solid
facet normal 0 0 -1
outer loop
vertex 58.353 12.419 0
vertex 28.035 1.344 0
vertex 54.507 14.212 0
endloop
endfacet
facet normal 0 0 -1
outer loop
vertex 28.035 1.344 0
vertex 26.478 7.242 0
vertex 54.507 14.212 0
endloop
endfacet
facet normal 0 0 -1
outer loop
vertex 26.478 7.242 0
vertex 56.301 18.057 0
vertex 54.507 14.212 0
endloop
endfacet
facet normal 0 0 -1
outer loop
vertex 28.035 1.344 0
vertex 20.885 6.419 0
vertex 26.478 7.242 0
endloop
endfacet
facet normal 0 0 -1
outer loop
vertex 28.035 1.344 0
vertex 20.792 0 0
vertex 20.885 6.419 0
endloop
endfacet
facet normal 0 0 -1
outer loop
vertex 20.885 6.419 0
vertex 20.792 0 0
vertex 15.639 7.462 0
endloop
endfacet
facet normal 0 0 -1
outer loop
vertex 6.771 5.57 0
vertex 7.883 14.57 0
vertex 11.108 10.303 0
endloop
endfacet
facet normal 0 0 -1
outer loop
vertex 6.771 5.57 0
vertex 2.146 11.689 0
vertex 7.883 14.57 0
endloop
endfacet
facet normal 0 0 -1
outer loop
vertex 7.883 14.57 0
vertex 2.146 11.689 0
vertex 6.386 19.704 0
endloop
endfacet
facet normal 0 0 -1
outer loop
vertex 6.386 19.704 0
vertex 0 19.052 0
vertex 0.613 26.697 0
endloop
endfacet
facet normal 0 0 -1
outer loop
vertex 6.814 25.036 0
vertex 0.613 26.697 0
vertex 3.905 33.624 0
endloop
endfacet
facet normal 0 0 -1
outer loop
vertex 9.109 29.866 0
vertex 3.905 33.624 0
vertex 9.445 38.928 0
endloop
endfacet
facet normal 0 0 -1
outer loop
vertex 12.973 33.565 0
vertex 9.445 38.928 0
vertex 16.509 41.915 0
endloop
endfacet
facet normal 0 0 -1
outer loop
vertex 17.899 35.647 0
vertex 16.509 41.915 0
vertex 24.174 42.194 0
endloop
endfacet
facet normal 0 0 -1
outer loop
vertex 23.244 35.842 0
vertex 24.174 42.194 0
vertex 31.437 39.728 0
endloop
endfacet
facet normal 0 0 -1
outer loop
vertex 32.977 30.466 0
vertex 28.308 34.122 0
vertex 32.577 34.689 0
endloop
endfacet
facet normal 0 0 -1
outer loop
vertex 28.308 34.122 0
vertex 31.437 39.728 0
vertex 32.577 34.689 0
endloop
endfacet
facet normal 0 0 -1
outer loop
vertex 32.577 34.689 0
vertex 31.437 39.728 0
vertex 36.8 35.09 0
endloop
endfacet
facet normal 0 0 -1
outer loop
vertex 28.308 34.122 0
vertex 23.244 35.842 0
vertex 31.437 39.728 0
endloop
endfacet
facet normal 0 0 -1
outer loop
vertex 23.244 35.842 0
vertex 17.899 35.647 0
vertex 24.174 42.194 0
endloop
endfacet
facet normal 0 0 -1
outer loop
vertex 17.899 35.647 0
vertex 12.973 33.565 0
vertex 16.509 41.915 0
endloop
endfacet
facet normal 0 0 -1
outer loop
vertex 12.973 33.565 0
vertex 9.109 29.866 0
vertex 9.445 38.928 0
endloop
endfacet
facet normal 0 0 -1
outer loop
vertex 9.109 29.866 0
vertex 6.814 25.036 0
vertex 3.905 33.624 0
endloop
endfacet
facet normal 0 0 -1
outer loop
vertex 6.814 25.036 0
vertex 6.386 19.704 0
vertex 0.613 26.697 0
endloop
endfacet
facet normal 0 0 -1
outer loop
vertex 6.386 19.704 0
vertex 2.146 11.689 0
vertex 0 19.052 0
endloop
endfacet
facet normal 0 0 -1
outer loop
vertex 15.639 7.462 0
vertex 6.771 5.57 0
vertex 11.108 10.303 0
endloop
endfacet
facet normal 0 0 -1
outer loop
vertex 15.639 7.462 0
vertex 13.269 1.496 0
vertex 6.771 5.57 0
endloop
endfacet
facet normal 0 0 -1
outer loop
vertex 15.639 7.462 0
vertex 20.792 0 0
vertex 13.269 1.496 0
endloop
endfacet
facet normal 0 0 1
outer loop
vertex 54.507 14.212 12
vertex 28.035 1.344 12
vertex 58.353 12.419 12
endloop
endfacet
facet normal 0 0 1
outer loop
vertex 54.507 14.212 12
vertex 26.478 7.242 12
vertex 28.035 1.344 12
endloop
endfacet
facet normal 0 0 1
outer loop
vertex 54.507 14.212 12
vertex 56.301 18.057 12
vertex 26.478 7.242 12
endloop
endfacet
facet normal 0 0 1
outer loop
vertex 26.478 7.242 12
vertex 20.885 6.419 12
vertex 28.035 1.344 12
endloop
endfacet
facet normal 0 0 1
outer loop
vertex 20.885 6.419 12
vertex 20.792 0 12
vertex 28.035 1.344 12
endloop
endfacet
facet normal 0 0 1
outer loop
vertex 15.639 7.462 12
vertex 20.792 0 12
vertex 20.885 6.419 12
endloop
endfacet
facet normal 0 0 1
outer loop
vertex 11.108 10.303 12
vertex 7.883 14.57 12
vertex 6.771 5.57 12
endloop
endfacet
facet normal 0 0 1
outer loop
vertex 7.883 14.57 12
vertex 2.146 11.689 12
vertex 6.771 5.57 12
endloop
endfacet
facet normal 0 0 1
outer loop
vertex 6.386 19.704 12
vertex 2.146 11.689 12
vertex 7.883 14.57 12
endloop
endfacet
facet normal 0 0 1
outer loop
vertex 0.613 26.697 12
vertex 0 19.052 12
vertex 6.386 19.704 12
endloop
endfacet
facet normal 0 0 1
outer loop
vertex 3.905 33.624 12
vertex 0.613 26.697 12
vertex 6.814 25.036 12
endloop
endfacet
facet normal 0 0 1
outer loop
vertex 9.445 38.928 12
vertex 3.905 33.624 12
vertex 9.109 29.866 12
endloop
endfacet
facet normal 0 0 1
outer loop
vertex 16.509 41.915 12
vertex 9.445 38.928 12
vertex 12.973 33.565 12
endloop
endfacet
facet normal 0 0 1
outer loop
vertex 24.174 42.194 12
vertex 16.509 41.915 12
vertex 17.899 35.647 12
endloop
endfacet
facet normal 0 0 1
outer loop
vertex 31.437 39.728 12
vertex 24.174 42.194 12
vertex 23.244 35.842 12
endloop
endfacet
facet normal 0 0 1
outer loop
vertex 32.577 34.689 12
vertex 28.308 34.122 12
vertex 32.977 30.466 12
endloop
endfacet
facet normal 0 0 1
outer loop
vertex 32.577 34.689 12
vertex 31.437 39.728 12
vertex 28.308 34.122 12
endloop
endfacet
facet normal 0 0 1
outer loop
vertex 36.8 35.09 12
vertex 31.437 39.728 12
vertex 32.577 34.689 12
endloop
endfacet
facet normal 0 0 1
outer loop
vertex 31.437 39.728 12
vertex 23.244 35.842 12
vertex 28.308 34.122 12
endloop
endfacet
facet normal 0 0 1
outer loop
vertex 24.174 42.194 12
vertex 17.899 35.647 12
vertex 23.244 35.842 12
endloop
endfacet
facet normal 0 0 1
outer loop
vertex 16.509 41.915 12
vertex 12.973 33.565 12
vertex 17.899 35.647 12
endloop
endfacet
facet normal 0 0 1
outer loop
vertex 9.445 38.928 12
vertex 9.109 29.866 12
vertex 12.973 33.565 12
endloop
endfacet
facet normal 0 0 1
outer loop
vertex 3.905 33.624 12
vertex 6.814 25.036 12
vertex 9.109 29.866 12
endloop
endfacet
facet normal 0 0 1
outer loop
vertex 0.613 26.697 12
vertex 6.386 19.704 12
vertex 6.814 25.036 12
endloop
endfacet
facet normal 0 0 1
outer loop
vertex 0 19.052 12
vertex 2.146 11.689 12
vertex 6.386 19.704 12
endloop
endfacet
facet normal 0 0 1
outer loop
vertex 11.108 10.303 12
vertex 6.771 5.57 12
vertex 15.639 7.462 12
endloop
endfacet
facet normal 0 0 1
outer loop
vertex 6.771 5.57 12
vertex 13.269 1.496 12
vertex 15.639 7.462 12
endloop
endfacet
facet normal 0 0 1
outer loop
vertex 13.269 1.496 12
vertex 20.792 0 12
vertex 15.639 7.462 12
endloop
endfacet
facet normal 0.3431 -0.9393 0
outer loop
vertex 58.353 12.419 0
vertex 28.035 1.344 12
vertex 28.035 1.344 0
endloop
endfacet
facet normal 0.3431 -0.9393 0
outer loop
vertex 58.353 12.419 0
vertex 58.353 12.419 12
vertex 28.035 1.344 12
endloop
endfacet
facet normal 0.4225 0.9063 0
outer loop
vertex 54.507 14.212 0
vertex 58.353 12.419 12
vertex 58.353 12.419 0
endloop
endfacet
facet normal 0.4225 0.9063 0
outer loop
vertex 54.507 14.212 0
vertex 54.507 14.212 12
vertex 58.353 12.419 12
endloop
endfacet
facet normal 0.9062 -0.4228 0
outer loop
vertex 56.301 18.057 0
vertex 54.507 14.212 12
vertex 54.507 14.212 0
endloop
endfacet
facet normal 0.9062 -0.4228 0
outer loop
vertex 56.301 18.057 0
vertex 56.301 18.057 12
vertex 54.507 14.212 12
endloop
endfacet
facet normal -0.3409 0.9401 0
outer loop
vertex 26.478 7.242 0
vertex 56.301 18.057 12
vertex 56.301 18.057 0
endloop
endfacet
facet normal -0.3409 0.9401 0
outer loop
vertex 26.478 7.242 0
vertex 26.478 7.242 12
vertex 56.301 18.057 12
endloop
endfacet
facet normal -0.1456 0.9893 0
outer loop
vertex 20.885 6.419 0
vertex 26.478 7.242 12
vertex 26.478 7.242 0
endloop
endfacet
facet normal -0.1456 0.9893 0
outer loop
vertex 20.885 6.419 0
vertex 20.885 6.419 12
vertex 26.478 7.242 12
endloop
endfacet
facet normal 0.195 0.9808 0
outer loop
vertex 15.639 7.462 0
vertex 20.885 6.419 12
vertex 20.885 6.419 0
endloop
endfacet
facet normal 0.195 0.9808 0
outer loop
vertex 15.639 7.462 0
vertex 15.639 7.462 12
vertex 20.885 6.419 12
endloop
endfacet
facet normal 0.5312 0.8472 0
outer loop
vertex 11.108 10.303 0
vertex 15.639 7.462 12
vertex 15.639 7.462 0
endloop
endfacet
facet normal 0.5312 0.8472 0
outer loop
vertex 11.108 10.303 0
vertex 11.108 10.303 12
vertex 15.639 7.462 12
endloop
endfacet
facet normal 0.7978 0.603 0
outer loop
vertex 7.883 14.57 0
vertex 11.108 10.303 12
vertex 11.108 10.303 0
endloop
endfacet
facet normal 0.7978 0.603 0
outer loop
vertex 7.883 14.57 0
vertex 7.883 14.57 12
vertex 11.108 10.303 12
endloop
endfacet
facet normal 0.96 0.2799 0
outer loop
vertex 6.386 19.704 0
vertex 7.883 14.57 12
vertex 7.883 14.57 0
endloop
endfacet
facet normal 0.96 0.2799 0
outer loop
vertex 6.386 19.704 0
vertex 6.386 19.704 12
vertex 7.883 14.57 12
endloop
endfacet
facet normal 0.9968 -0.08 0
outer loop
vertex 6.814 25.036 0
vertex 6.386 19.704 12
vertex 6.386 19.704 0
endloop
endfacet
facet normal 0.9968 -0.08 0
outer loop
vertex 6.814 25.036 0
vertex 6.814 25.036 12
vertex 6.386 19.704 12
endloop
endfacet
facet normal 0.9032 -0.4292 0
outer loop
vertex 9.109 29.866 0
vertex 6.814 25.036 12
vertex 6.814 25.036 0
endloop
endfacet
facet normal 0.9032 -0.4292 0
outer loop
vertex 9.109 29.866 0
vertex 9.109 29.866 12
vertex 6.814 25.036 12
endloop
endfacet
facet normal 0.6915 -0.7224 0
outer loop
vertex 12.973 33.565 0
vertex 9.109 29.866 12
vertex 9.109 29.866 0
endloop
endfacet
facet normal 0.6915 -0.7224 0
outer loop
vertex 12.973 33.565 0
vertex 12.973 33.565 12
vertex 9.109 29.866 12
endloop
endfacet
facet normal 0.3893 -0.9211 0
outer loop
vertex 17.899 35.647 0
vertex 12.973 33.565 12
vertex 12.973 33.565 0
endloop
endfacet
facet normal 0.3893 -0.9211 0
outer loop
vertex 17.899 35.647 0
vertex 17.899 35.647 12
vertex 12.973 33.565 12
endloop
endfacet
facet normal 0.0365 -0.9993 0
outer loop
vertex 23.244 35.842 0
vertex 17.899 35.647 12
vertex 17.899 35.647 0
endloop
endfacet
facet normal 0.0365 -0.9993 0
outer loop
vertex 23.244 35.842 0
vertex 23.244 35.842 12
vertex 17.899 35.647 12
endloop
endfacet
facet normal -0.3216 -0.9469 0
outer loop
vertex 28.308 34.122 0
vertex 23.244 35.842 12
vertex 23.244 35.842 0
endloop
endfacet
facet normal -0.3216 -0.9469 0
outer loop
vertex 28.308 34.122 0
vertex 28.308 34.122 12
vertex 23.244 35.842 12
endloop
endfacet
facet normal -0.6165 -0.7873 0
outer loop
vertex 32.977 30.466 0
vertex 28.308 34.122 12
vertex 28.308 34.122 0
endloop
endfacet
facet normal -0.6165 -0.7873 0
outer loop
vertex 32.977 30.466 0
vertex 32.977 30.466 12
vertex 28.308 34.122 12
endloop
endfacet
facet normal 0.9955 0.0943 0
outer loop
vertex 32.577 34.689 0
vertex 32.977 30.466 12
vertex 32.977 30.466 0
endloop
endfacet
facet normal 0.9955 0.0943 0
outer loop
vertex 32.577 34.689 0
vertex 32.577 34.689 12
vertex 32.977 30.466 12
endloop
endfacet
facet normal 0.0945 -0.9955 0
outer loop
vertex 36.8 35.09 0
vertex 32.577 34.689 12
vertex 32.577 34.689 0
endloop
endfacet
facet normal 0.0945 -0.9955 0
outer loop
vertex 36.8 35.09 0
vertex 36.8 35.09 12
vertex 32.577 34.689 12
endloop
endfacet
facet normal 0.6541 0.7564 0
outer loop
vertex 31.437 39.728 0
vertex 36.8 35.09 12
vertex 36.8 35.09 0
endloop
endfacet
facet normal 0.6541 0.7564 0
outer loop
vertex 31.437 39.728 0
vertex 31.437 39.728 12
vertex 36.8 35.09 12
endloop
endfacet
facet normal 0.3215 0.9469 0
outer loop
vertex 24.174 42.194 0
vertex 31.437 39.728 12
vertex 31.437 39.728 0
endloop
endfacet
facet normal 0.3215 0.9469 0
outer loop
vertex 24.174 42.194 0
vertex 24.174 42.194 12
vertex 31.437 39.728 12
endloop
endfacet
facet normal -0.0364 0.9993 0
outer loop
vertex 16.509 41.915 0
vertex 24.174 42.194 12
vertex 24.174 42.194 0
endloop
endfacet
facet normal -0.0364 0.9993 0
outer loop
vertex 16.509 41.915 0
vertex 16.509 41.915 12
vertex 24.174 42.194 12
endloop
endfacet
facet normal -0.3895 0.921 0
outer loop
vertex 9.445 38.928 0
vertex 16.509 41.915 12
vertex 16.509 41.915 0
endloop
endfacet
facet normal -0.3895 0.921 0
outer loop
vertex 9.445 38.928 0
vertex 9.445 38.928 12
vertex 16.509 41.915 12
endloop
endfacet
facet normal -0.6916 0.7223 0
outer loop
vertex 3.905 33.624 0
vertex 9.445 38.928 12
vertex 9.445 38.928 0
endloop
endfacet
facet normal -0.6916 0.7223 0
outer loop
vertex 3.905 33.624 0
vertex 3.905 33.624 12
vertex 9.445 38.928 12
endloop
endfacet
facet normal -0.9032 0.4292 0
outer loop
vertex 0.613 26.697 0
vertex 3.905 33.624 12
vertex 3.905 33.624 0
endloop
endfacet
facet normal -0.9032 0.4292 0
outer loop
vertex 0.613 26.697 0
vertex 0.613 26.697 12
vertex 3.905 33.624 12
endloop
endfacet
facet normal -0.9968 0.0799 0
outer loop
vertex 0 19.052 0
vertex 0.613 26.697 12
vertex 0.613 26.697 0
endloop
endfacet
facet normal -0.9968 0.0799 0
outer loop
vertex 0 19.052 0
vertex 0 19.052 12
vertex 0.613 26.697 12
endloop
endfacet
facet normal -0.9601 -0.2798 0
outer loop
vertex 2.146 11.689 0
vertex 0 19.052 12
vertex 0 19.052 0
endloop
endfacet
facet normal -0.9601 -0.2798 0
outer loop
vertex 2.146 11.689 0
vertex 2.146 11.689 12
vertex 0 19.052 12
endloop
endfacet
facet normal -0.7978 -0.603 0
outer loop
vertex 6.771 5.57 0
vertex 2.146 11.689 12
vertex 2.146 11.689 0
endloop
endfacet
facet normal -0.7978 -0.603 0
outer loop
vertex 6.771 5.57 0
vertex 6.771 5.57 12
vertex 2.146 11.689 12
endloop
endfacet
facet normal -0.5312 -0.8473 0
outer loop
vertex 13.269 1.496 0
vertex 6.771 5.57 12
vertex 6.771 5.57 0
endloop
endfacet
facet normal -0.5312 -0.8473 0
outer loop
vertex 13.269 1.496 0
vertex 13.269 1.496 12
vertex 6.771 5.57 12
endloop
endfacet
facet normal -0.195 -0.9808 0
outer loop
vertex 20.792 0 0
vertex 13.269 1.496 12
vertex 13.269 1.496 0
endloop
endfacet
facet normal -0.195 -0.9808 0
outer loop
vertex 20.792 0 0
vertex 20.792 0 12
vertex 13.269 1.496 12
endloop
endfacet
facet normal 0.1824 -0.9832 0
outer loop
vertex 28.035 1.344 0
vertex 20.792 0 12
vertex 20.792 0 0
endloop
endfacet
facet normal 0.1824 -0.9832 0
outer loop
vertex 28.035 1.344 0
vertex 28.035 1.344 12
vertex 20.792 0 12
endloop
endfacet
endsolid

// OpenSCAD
$fn = 32;

// ----------------------------------------------------------------------
// Eye lug: ring_tail, 12 mm thick
// ----------------------------------------------------------------------

// --- parameters (mm) ---
profile_height = 12;      // extrusion height
profile_points = 30;      // points of the closed outline

profile = [[32.577, 34.689], [36.8, 35.09], [31.437, 39.728], [24.174, 42.194], [16.509, 41.915], [9.445, 38.928], [3.905, 33.624], [0.613, 26.697], [0, 19.052], [2.146, 11.689], [6.771, 5.57], [13.269, 1.496], [20.792, 0], [28.035, 1.344], [58.353, 12.419], [54.507, 14.212], [56.301, 18.057], [26.478, 7.242], [20.885, 6.419], [15.639, 7.462], [11.108, 10.303], [7.883, 14.57], [6.386, 19.704], [6.814, 25.036], [9.109, 29.866], [12.973, 33.565], [17.899, 35.647], [23.244, 35.842], [28.308, 34.122], [32.977, 30.466]];  // single closed polygon, 30 points, counter clockwise

// --- the one profile operation ---
linear_extrude(height = profile_height) polygon(points = profile);
